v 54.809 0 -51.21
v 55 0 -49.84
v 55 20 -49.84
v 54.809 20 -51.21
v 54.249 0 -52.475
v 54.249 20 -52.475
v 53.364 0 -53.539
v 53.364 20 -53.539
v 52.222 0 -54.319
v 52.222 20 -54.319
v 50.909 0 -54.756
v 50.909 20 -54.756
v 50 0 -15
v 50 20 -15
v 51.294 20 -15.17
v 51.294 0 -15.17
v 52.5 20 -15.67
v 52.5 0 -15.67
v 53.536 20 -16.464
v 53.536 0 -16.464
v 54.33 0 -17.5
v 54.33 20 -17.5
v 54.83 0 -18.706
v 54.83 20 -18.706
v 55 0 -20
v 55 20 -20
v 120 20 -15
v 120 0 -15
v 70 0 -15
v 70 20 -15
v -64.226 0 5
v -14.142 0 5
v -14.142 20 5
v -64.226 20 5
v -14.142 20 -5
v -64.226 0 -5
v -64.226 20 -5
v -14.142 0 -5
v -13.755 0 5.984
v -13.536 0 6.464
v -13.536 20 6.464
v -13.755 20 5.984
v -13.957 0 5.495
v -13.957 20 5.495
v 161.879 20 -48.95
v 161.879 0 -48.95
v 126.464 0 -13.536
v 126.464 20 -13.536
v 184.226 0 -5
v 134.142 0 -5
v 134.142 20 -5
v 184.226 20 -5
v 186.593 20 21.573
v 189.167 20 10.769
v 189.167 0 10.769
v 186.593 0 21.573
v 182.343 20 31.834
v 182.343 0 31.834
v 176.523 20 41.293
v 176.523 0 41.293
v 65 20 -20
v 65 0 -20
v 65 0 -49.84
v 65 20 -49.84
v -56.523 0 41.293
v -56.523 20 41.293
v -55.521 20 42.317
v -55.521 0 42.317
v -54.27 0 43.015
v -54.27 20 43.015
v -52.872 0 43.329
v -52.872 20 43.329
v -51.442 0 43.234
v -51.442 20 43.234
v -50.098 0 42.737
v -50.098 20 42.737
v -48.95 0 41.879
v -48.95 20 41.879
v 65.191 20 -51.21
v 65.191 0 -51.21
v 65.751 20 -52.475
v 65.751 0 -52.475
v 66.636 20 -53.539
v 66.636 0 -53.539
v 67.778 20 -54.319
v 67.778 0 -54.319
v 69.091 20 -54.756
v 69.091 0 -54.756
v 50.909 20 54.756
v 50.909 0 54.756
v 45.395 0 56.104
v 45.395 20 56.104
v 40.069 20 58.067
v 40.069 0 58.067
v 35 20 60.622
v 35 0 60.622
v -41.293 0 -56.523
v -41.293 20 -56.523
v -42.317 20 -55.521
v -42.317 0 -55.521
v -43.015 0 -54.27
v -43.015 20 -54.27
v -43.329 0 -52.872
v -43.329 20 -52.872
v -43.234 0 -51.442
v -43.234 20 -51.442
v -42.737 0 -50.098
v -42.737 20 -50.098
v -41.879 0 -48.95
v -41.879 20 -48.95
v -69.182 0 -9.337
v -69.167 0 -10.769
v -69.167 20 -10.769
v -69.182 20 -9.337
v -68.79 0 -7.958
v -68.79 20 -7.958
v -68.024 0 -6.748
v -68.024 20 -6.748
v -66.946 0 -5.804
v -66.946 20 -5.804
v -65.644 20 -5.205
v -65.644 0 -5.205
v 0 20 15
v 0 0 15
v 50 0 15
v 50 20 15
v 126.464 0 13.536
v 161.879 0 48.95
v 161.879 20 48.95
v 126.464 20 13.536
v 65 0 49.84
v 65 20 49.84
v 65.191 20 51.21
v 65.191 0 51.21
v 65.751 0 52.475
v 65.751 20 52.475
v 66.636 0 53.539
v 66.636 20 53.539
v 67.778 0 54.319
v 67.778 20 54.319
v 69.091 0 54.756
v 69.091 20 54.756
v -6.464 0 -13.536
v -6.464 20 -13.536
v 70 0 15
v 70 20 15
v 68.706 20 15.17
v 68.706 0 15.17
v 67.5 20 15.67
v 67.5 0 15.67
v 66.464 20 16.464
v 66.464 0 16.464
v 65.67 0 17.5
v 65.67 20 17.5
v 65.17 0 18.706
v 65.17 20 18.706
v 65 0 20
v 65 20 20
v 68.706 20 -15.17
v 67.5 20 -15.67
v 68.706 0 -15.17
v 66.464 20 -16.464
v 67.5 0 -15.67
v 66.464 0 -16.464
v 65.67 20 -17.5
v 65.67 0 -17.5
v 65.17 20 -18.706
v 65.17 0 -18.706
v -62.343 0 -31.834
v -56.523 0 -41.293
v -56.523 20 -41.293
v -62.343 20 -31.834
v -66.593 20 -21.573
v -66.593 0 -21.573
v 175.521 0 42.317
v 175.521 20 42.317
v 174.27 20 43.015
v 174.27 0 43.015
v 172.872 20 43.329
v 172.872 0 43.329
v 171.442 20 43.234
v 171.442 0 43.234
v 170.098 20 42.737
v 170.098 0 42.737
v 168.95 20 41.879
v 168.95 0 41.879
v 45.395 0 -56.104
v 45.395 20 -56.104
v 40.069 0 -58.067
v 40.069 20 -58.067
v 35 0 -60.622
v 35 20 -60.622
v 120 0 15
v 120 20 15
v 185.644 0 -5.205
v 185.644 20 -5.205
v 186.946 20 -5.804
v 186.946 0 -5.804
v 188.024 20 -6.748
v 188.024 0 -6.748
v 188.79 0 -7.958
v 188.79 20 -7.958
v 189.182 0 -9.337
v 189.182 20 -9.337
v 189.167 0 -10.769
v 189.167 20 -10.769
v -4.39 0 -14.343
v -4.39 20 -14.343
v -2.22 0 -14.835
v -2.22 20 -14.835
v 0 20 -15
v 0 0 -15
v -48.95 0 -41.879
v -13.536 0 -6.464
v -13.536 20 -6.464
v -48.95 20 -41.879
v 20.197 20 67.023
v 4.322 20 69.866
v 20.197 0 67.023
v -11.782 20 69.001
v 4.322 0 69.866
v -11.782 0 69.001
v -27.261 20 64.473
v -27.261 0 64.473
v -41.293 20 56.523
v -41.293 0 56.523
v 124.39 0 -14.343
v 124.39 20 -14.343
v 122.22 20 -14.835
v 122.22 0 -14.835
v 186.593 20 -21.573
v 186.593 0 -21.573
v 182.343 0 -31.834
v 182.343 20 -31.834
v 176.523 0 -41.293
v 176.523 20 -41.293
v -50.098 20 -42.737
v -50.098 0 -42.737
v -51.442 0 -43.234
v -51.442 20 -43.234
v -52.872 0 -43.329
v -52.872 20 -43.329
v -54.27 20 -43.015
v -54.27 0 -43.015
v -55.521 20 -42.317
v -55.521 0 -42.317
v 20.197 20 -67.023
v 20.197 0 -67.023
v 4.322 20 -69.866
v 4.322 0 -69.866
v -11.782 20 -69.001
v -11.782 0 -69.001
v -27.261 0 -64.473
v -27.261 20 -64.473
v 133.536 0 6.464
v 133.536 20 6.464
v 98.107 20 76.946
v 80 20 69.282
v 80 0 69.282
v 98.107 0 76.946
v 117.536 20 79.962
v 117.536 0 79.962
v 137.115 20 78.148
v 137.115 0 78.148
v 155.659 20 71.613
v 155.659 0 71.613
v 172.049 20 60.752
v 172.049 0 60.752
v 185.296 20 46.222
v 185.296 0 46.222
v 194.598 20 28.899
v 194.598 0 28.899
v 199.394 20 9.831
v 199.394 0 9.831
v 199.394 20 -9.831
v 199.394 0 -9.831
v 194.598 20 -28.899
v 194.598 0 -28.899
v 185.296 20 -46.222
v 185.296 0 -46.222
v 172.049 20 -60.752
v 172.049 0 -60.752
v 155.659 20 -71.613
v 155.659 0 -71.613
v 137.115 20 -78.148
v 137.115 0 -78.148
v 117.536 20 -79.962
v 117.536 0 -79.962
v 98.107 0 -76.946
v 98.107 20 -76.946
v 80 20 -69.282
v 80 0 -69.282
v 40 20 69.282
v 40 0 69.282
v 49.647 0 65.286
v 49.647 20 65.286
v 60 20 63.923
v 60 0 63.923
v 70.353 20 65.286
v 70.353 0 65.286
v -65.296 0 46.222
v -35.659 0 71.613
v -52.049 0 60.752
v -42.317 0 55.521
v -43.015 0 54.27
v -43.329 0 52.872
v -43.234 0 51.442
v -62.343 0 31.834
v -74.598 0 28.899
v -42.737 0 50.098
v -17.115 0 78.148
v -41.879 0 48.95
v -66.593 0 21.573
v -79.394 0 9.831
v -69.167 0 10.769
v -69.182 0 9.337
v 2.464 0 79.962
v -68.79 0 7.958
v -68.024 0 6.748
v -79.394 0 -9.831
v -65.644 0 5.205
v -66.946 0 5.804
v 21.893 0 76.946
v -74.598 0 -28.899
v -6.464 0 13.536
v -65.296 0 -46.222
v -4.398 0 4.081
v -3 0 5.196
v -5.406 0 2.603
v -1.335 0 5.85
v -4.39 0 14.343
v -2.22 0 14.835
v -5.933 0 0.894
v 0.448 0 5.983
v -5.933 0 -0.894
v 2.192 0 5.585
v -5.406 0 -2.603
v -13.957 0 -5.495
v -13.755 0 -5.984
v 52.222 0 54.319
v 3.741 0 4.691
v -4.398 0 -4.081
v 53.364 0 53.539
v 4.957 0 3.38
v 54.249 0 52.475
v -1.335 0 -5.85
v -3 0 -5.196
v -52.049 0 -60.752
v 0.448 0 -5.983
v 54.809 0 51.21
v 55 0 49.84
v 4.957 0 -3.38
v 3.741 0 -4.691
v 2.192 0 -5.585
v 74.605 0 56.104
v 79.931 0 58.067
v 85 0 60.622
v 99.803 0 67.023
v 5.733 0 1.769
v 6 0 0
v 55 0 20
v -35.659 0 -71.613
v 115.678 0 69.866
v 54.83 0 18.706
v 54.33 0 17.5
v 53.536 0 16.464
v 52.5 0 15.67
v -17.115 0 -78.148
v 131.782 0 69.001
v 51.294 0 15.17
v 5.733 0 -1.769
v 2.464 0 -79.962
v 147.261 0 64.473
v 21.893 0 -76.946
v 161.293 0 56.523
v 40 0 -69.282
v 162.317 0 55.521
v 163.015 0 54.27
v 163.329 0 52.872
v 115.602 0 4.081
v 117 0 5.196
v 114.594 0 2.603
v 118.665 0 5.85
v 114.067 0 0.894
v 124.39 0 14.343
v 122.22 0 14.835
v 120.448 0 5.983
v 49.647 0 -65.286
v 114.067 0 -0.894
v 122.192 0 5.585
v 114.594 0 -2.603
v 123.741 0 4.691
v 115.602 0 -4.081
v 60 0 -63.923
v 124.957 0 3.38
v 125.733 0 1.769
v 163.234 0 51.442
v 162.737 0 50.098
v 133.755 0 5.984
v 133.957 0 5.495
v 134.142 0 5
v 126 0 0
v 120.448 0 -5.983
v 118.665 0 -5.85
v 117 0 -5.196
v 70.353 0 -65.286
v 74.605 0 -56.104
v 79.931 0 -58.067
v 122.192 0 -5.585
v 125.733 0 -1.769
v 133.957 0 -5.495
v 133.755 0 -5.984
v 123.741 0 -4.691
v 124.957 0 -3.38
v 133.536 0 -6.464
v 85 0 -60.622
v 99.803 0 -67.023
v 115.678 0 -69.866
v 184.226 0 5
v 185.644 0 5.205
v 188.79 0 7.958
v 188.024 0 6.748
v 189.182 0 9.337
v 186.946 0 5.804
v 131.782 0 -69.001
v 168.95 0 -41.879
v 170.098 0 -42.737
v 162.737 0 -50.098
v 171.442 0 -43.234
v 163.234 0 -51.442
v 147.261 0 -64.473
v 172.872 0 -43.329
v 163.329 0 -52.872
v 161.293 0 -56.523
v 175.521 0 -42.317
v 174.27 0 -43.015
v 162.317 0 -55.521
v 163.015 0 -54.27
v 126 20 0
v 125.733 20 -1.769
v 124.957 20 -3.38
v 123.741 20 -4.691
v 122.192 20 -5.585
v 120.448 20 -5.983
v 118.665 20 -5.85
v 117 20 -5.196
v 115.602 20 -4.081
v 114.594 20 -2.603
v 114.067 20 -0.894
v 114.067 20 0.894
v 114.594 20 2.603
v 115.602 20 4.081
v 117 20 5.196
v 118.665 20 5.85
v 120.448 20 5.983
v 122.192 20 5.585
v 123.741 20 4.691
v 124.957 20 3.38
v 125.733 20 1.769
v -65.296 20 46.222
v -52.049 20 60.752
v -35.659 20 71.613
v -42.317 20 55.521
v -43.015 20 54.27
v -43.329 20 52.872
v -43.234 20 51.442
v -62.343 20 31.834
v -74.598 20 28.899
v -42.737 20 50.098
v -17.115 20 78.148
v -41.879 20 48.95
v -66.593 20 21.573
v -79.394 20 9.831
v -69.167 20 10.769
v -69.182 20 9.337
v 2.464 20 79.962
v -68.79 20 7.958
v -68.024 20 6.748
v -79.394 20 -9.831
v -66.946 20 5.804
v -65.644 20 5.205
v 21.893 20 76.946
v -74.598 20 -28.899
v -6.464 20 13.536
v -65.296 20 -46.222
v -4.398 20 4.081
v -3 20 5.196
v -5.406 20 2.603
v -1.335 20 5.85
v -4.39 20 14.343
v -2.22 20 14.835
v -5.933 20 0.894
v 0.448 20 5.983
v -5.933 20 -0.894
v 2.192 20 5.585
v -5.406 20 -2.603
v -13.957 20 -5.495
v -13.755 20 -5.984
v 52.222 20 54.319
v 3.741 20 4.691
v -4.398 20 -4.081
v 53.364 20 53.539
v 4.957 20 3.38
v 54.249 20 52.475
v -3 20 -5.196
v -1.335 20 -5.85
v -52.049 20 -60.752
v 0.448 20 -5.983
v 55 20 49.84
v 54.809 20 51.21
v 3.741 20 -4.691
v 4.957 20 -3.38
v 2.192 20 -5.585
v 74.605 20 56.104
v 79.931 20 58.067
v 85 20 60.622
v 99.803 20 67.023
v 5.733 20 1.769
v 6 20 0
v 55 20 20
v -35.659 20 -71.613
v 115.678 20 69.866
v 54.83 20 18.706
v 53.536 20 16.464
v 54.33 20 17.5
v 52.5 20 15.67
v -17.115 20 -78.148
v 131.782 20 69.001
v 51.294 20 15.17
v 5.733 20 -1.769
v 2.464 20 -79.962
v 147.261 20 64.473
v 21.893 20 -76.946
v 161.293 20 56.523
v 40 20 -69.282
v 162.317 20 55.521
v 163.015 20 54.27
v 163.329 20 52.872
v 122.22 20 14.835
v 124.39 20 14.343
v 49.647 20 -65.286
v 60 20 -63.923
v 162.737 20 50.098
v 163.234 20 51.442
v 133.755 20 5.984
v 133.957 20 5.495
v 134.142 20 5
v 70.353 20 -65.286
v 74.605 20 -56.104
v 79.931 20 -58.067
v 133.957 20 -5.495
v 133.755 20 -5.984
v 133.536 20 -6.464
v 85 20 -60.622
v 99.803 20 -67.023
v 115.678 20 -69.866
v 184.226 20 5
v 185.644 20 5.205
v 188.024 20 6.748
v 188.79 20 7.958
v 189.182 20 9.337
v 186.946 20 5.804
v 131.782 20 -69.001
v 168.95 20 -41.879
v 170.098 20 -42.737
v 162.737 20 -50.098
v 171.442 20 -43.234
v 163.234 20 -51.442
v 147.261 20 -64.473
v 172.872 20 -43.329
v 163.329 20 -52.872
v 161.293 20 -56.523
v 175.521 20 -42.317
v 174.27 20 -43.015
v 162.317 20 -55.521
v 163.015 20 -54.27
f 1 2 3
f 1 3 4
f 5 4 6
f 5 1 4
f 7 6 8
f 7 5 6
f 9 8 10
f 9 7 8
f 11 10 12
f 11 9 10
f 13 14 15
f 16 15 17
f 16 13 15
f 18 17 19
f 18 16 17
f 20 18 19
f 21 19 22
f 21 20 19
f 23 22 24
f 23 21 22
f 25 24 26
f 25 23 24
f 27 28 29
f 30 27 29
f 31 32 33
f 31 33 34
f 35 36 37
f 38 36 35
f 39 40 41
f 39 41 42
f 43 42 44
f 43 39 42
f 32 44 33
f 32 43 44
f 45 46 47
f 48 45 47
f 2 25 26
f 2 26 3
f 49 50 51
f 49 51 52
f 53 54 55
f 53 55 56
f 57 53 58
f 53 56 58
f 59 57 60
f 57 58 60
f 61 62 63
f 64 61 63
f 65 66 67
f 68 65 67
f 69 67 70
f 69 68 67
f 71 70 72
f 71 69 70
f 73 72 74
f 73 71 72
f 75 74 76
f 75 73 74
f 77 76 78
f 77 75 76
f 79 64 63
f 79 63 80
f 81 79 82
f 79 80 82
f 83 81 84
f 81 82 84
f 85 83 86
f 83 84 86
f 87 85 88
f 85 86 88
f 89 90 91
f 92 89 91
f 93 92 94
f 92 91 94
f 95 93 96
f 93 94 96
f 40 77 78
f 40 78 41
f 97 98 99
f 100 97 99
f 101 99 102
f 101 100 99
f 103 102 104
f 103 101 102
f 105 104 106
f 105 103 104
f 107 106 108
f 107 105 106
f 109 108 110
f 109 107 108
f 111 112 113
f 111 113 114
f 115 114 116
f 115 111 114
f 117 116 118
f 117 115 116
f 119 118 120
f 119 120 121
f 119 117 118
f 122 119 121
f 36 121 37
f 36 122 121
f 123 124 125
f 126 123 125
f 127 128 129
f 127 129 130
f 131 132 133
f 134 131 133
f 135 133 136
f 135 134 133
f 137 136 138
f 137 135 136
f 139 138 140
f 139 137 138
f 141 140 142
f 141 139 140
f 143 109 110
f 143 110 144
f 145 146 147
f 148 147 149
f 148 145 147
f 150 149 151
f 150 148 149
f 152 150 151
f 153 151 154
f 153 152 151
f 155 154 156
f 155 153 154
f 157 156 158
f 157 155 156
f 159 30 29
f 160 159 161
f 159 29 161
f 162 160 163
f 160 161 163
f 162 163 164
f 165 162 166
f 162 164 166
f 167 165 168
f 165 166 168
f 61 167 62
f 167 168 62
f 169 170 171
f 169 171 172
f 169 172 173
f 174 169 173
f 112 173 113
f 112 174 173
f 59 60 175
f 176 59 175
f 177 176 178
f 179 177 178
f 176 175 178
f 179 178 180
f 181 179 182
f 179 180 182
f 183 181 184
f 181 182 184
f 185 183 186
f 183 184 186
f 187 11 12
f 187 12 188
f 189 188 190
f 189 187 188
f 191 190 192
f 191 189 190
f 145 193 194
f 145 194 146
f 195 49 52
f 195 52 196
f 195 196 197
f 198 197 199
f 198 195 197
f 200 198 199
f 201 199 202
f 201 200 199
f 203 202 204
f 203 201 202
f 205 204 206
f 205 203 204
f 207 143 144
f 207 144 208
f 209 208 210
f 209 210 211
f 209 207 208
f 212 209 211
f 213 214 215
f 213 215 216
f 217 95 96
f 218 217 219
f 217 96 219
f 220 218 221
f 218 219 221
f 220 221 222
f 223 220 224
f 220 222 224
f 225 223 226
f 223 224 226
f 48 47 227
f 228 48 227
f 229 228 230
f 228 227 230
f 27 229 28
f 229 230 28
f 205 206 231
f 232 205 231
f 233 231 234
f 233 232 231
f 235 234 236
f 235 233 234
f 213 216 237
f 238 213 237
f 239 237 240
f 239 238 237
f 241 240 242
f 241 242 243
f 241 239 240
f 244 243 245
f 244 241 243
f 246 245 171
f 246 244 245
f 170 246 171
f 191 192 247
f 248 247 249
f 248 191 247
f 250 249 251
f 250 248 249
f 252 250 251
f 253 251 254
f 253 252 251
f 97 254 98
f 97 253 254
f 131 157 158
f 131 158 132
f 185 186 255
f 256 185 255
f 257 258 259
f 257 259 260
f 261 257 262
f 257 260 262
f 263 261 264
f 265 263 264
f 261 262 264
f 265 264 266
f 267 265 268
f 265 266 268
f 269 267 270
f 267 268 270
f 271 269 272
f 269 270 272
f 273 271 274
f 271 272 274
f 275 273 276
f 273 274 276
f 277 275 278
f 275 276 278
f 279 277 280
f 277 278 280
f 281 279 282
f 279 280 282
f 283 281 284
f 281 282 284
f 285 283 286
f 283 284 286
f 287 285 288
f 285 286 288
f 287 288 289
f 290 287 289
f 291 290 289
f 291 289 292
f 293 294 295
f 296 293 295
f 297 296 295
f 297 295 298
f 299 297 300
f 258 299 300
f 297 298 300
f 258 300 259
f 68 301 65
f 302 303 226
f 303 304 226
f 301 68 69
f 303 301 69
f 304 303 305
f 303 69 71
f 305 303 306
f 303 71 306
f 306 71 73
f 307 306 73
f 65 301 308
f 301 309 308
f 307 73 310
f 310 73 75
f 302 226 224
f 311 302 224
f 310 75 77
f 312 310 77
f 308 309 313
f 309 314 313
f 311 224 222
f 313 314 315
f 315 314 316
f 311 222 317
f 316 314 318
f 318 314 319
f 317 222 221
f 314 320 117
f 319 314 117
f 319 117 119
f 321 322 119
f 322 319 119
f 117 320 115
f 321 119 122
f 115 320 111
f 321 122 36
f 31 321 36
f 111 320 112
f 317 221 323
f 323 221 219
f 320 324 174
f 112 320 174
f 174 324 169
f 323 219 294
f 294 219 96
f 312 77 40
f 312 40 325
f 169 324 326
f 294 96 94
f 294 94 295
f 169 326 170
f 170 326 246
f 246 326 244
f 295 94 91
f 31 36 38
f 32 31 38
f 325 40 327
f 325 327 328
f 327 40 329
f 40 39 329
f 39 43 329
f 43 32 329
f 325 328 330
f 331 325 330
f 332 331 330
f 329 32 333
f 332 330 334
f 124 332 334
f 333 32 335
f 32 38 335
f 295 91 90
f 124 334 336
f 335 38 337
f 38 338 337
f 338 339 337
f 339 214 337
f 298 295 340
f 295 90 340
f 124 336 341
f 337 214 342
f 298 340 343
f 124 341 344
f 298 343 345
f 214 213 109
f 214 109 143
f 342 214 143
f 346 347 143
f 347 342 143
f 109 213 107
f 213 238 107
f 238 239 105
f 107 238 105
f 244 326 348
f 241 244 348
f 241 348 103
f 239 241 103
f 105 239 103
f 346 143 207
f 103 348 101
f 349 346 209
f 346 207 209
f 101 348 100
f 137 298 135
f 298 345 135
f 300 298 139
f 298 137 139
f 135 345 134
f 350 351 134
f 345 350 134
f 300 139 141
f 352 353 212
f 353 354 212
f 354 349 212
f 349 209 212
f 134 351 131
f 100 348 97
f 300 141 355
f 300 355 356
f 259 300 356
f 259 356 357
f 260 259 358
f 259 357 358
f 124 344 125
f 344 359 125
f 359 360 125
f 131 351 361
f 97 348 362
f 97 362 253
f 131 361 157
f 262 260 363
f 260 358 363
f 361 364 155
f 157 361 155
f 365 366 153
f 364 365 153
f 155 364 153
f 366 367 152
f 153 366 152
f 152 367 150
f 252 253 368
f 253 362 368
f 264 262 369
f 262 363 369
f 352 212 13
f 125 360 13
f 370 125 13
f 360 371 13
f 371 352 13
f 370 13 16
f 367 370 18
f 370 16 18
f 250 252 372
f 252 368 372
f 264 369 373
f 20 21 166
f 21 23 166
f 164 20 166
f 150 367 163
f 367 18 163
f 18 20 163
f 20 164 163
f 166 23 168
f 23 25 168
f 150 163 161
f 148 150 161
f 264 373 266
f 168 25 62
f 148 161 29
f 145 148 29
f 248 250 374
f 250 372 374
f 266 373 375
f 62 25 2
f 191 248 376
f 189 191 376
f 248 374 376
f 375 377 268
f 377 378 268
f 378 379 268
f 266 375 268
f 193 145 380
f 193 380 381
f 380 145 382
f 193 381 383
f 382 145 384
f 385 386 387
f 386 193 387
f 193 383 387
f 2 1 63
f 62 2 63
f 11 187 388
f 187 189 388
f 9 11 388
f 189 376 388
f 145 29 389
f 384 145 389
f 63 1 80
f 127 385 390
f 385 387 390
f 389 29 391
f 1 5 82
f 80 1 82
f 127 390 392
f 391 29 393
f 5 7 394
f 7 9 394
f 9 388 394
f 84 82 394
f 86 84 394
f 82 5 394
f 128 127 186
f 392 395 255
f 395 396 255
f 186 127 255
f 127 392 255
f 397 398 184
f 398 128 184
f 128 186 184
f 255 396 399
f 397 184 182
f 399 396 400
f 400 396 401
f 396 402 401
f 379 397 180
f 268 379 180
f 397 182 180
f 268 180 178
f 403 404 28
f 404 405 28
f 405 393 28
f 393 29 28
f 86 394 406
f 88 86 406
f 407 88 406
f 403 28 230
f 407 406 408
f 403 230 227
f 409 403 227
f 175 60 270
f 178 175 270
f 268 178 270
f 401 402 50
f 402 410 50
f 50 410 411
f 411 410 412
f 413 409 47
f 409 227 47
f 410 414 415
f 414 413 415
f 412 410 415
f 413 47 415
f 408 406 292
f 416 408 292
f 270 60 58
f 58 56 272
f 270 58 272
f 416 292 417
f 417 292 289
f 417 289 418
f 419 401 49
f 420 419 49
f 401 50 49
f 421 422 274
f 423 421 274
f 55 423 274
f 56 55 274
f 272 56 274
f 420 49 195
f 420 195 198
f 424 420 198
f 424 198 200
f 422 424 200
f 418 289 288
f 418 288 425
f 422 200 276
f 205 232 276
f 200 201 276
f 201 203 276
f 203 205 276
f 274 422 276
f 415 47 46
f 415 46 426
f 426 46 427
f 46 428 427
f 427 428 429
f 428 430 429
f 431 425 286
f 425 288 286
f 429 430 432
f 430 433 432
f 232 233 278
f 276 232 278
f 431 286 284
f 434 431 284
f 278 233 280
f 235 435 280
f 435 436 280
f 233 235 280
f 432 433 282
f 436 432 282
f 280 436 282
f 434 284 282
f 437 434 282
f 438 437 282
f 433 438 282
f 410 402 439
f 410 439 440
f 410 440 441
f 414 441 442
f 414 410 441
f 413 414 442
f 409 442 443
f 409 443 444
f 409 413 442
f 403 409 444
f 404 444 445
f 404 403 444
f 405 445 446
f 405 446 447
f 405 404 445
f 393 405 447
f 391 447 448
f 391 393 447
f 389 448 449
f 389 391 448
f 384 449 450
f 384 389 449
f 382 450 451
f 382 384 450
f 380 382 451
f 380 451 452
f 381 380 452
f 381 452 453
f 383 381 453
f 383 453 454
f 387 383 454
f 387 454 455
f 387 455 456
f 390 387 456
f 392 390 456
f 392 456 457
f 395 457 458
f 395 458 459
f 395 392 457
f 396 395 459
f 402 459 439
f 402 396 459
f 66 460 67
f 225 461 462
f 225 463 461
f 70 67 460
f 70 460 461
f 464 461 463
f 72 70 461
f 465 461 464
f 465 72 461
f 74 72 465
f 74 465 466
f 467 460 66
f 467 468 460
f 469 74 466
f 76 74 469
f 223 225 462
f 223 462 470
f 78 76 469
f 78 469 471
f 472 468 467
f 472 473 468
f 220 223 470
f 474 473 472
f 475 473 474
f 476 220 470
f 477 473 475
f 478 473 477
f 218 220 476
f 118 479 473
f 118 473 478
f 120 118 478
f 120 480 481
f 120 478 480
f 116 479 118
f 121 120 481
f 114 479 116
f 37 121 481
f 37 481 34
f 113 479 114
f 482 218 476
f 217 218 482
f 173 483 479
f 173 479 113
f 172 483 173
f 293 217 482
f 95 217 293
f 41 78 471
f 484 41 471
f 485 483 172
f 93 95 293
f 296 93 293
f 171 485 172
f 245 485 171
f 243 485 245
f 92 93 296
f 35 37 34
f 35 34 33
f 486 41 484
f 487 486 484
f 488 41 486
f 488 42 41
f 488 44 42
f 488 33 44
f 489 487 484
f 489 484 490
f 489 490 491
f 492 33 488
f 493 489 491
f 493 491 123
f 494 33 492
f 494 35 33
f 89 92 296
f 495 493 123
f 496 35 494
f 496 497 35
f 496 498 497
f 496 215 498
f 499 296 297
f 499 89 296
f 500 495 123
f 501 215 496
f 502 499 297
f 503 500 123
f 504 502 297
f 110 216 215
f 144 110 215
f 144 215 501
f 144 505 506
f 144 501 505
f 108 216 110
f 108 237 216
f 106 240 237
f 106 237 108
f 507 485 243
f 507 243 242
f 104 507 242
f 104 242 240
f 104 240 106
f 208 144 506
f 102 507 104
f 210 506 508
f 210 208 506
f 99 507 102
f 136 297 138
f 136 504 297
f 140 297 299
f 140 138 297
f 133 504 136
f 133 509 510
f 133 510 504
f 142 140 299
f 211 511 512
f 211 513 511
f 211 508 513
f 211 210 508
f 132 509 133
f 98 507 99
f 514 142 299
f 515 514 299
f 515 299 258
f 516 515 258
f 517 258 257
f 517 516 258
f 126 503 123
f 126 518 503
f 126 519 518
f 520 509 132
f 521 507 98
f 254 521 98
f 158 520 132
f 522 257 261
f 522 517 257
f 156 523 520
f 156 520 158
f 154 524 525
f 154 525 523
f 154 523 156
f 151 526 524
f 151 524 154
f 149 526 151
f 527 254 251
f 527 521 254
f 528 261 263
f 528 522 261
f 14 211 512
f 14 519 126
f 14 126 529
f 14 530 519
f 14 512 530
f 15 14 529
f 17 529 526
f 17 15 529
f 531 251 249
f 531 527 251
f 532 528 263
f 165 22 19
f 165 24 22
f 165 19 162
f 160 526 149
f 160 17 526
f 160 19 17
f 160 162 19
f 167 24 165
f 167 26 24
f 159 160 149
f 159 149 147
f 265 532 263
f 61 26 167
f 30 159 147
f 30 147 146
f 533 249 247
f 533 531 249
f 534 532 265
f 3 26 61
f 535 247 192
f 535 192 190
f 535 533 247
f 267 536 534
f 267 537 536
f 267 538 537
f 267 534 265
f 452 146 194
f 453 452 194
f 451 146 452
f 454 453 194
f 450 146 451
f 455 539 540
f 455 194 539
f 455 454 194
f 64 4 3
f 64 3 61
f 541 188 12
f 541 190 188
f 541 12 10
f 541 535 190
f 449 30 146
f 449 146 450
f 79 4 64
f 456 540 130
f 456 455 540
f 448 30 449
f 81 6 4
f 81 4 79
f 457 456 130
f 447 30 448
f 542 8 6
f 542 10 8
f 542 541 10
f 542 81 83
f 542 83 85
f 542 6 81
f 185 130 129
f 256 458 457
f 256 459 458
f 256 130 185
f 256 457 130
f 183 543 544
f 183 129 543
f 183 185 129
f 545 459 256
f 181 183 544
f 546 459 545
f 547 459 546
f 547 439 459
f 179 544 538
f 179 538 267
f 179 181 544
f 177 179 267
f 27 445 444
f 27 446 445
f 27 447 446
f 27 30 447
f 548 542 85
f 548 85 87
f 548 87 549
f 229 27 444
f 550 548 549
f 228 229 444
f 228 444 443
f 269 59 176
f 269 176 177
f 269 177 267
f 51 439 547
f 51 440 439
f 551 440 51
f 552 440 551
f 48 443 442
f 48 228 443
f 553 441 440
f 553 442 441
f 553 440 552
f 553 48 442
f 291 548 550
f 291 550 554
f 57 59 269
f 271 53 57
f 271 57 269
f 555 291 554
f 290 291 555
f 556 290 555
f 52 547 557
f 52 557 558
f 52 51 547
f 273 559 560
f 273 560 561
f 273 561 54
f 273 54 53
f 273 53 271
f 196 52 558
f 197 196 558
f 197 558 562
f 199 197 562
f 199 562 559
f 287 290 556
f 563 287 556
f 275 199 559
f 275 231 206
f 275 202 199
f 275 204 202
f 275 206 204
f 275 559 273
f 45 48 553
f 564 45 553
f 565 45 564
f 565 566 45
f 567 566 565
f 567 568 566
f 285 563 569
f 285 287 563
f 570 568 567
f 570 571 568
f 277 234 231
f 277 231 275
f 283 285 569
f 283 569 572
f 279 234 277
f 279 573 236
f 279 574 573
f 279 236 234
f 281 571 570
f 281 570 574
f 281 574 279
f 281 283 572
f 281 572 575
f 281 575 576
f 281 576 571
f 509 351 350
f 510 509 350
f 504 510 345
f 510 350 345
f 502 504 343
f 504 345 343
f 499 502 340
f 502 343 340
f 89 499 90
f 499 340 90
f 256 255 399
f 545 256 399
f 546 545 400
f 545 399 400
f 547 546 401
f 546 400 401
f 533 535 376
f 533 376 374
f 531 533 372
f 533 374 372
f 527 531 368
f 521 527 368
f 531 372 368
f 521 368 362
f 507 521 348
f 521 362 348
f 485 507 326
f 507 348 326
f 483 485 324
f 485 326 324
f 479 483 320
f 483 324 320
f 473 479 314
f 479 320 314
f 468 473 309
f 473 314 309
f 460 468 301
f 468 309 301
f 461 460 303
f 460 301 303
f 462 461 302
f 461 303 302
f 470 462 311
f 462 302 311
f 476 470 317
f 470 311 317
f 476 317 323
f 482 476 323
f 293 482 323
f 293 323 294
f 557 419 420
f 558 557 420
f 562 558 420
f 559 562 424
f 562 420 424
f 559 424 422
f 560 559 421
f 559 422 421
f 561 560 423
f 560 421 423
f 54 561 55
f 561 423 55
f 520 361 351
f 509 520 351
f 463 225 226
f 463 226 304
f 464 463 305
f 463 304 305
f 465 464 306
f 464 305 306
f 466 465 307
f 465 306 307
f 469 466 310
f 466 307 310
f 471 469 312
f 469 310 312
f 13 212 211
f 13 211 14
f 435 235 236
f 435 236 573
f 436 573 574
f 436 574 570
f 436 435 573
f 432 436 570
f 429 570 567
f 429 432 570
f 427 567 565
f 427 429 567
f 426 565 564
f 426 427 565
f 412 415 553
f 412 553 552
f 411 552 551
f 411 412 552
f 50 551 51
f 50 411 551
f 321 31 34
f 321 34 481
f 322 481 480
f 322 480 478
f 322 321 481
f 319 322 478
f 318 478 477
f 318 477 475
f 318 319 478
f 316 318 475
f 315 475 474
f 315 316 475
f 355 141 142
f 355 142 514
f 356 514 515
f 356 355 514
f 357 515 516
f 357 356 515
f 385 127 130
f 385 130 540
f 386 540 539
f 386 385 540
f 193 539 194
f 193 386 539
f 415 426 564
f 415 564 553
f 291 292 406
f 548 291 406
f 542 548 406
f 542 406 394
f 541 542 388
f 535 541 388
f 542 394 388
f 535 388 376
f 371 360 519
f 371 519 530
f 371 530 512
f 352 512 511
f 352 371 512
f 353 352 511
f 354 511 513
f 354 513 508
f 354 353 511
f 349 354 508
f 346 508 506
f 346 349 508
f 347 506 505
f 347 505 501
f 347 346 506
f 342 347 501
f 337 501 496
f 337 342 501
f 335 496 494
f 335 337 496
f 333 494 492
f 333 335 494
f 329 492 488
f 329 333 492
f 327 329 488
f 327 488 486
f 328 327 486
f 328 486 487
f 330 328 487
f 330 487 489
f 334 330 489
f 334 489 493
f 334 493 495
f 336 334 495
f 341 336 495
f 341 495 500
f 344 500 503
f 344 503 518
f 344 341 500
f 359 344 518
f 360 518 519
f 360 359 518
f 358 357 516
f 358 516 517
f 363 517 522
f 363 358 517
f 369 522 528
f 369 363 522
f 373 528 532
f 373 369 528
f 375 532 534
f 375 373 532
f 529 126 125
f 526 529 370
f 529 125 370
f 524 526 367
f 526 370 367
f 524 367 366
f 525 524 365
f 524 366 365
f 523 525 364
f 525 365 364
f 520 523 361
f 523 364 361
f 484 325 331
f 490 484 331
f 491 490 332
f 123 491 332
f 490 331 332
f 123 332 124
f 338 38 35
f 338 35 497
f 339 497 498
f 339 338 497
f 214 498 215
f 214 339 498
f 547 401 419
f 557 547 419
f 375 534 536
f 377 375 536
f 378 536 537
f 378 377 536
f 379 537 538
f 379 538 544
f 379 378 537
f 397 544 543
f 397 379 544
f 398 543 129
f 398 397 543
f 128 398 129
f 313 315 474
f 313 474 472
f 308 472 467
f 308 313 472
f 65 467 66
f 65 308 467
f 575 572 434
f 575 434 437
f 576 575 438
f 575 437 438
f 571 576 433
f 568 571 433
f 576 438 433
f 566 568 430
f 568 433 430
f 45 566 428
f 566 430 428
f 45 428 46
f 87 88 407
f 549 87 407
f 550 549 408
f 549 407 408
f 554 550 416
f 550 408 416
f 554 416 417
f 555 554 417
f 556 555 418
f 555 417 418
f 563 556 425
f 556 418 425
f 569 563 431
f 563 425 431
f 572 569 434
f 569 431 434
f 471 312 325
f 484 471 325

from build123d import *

# Parameters (mm, degrees)
SKETCH1_R           = 6
BOSS_EXTRUDE1_DEPTH = 20


with BuildPart() as part:
    # Sketch1 → Boss-Extrude1 (new body)
    with BuildSketch(Plane(origin=(0, 0, 0), x_dir=(1, 0, 0), z_dir=(0, 1, 0))):
        with BuildLine():
            ThreePointArc((40, 69.282032303), (-80, 0), (40, -69.282032303))
            ThreePointArc((40, -69.282032303), (60, -63.923048454), (80, -69.282032303))
            ThreePointArc((80, -69.282032303), (200, 0), (80, 69.282032303))
            ThreePointArc((80, 69.282032303), (60, 63.923048454), (40, 69.282032303))
        make_face()
        Circle(SKETCH1_R, mode=Mode.SUBTRACT)
        with Locations((120, 0)):
            Circle(SKETCH1_R, mode=Mode.SUBTRACT)
        with BuildLine():
            Line((55, 20), (55, 49.839779322))
            ThreePointArc((55, 49.839779322), (53.843530574, 53.037790068), (50.909090909, 54.756440152))
            ThreePointArc((50.909090909, 54.756440152), (42.704102554, 57.009810114), (35, 60.621778265))
            ThreePointArc((35, 60.621778265), (-3.755089291, 69.899208182), (-41.293201923, 56.523194133))
            ThreePointArc((-41.293201923, 56.523194133), (-43.328783805, 52.871588373), (-41.879221406, 48.950289217))
            Line((-41.879221406, 48.950289217), (-6.464466094, 13.535533906))
            ThreePointArc((-6.464466094, 13.535533906), (-3.31413574, 14.629302933), (0, 15))
            Line((0, 15), (50, 15))
            ThreePointArc((50, 15), (53.535533906, 16.464466094), (55, 20))
        make_face(mode=Mode.SUBTRACT)
        with BuildLine():
            Line((0, -15), (50, -15))
            ThreePointArc((50, -15), (53.535533906, -16.464466094), (55, -20))
            Line((55, -20), (55, -49.839779322))
            ThreePointArc((55, -49.839779322), (53.843530574, -53.037790068), (50.909090909, -54.756440152))
            ThreePointArc((50.909090909, -54.756440152), (42.704102554, -57.009810114), (35, -60.621778265))
            ThreePointArc((35, -60.621778265), (-3.755089291, -69.899208182), (-41.293201923, -56.523194133))
            ThreePointArc((-41.293201923, -56.523194133), (-43.328783805, -52.871588373), (-41.879221406, -48.950289217))
            Line((-41.879221406, -48.950289217), (-6.464466094, -13.535533906))
            ThreePointArc((-6.464466094, -13.535533906), (-3.31413574, -14.629302933), (0, -15))
        make_face(mode=Mode.SUBTRACT)
        with BuildLine():
            Line((65, 20), (65, 49.839779322))
            ThreePointArc((65, 49.839779322), (66.156469426, 53.037790068), (69.090909091, 54.756440152))
            ThreePointArc((69.090909091, 54.756440152), (77.295897446, 57.009810114), (85, 60.621778265))
            ThreePointArc((85, 60.621778265), (123.755089291, 69.899208182), (161.293201923, 56.523194133))
            ThreePointArc((161.293201923, 56.523194133), (163.328783805, 52.871588373), (161.879221406, 48.950289217))
            Line((161.879221406, 48.950289217), (126.464466094, 13.535533906))
            ThreePointArc((126.464466094, 13.535533906), (123.31413574, 14.629302933), (120, 15))
            Line((120, 15), (70, 15))
            ThreePointArc((70, 15), (66.464466094, 16.464466094), (65, 20))
        make_face(mode=Mode.SUBTRACT)
        with BuildLine():
            Line((65, -20), (65, -49.839779322))
            ThreePointArc((65, -49.839779322), (66.156469426, -53.037790068), (69.090909091, -54.756440152))
            ThreePointArc((69.090909091, -54.756440152), (77.295897446, -57.009810114), (85, -60.621778265))
            ThreePointArc((85, -60.621778265), (123.755089291, -69.899208182), (161.293201923, -56.523194133))
            ThreePointArc((161.293201923, -56.523194133), (163.328783805, -52.871588373), (161.879221406, -48.950289217))
            Line((161.879221406, -48.950289217), (126.464466094, -13.535533906))
            ThreePointArc((126.464466094, -13.535533906), (123.31413574, -14.629302933), (120, -15))
            Line((120, -15), (70, -15))
            ThreePointArc((70, -15), (66.464466094, -16.464466094), (65, -20))
        make_face(mode=Mode.SUBTRACT)
        with BuildLine():
            Line((134.142135624, 5), (184.226162893, 5))
            ThreePointArc((184.226162893, 5), (188.02393552, 6.747781822), (189.166636962, 10.769230769))
            ThreePointArc((189.166636962, 10.769230769), (184.671567276, 26.787840266), (176.523194133, 41.293201923))
            ThreePointArc((176.523194133, 41.293201923), (172.871588373, 43.328783805), (168.950289217, 41.879221406))
            Line((168.950289217, 41.879221406), (133.535533906, 6.464466094))
            ThreePointArc((133.535533906, 6.464466094), (133.858192988, 5.740251485), (134.142135624, 5))
        make_face(mode=Mode.SUBTRACT)
        with BuildLine():
            Line((134.142135624, -5), (184.226162893, -5))
            ThreePointArc((184.226162893, -5), (188.02393552, -6.747781822), (189.166636962, -10.769230769))
            ThreePointArc((189.166636962, -10.769230769), (184.671567276, -26.787840266), (176.523194133, -41.293201923))
            ThreePointArc((176.523194133, -41.293201923), (172.871588373, -43.328783805), (168.950289217, -41.879221406))
            Line((168.950289217, -41.879221406), (133.535533906, -6.464466094))
            ThreePointArc((133.535533906, -6.464466094), (133.858192988, -5.740251485), (134.142135624, -5))
        make_face(mode=Mode.SUBTRACT)
        with BuildLine():
            Line((-13.535533906, 6.464466094), (-48.950289217, 41.879221406))
            ThreePointArc((-48.950289217, 41.879221406), (-52.871588373, 43.328783805), (-56.523194133, 41.293201923))
            ThreePointArc((-56.523194133, 41.293201923), (-64.671567276, 26.787840266), (-69.166636962, 10.769230769))
            ThreePointArc((-69.166636962, 10.769230769), (-68.02393552, 6.747781822), (-64.226162893, 5))
            Line((-64.226162893, 5), (-14.142135624, 5))
            ThreePointArc((-14.142135624, 5), (-13.858192988, 5.740251485), (-13.535533906, 6.464466094))
        make_face(mode=Mode.SUBTRACT)
        with BuildLine():
            Line((-14.142135624, -5), (-64.226162893, -5))
            ThreePointArc((-64.226162893, -5), (-68.02393552, -6.747781822), (-69.166636962, -10.769230769))
            ThreePointArc((-69.166636962, -10.769230769), (-64.671567276, -26.787840266), (-56.523194133, -41.293201923))
            ThreePointArc((-56.523194133, -41.293201923), (-52.871588373, -43.328783805), (-48.950289217, -41.879221406))
            Line((-48.950289217, -41.879221406), (-13.535533906, -6.464466094))
            ThreePointArc((-13.535533906, -6.464466094), (-13.858192988, -5.740251485), (-14.142135624, -5))
        make_face(mode=Mode.SUBTRACT)
    extrude(amount=BOSS_EXTRUDE1_DEPTH)


solid = part.part
